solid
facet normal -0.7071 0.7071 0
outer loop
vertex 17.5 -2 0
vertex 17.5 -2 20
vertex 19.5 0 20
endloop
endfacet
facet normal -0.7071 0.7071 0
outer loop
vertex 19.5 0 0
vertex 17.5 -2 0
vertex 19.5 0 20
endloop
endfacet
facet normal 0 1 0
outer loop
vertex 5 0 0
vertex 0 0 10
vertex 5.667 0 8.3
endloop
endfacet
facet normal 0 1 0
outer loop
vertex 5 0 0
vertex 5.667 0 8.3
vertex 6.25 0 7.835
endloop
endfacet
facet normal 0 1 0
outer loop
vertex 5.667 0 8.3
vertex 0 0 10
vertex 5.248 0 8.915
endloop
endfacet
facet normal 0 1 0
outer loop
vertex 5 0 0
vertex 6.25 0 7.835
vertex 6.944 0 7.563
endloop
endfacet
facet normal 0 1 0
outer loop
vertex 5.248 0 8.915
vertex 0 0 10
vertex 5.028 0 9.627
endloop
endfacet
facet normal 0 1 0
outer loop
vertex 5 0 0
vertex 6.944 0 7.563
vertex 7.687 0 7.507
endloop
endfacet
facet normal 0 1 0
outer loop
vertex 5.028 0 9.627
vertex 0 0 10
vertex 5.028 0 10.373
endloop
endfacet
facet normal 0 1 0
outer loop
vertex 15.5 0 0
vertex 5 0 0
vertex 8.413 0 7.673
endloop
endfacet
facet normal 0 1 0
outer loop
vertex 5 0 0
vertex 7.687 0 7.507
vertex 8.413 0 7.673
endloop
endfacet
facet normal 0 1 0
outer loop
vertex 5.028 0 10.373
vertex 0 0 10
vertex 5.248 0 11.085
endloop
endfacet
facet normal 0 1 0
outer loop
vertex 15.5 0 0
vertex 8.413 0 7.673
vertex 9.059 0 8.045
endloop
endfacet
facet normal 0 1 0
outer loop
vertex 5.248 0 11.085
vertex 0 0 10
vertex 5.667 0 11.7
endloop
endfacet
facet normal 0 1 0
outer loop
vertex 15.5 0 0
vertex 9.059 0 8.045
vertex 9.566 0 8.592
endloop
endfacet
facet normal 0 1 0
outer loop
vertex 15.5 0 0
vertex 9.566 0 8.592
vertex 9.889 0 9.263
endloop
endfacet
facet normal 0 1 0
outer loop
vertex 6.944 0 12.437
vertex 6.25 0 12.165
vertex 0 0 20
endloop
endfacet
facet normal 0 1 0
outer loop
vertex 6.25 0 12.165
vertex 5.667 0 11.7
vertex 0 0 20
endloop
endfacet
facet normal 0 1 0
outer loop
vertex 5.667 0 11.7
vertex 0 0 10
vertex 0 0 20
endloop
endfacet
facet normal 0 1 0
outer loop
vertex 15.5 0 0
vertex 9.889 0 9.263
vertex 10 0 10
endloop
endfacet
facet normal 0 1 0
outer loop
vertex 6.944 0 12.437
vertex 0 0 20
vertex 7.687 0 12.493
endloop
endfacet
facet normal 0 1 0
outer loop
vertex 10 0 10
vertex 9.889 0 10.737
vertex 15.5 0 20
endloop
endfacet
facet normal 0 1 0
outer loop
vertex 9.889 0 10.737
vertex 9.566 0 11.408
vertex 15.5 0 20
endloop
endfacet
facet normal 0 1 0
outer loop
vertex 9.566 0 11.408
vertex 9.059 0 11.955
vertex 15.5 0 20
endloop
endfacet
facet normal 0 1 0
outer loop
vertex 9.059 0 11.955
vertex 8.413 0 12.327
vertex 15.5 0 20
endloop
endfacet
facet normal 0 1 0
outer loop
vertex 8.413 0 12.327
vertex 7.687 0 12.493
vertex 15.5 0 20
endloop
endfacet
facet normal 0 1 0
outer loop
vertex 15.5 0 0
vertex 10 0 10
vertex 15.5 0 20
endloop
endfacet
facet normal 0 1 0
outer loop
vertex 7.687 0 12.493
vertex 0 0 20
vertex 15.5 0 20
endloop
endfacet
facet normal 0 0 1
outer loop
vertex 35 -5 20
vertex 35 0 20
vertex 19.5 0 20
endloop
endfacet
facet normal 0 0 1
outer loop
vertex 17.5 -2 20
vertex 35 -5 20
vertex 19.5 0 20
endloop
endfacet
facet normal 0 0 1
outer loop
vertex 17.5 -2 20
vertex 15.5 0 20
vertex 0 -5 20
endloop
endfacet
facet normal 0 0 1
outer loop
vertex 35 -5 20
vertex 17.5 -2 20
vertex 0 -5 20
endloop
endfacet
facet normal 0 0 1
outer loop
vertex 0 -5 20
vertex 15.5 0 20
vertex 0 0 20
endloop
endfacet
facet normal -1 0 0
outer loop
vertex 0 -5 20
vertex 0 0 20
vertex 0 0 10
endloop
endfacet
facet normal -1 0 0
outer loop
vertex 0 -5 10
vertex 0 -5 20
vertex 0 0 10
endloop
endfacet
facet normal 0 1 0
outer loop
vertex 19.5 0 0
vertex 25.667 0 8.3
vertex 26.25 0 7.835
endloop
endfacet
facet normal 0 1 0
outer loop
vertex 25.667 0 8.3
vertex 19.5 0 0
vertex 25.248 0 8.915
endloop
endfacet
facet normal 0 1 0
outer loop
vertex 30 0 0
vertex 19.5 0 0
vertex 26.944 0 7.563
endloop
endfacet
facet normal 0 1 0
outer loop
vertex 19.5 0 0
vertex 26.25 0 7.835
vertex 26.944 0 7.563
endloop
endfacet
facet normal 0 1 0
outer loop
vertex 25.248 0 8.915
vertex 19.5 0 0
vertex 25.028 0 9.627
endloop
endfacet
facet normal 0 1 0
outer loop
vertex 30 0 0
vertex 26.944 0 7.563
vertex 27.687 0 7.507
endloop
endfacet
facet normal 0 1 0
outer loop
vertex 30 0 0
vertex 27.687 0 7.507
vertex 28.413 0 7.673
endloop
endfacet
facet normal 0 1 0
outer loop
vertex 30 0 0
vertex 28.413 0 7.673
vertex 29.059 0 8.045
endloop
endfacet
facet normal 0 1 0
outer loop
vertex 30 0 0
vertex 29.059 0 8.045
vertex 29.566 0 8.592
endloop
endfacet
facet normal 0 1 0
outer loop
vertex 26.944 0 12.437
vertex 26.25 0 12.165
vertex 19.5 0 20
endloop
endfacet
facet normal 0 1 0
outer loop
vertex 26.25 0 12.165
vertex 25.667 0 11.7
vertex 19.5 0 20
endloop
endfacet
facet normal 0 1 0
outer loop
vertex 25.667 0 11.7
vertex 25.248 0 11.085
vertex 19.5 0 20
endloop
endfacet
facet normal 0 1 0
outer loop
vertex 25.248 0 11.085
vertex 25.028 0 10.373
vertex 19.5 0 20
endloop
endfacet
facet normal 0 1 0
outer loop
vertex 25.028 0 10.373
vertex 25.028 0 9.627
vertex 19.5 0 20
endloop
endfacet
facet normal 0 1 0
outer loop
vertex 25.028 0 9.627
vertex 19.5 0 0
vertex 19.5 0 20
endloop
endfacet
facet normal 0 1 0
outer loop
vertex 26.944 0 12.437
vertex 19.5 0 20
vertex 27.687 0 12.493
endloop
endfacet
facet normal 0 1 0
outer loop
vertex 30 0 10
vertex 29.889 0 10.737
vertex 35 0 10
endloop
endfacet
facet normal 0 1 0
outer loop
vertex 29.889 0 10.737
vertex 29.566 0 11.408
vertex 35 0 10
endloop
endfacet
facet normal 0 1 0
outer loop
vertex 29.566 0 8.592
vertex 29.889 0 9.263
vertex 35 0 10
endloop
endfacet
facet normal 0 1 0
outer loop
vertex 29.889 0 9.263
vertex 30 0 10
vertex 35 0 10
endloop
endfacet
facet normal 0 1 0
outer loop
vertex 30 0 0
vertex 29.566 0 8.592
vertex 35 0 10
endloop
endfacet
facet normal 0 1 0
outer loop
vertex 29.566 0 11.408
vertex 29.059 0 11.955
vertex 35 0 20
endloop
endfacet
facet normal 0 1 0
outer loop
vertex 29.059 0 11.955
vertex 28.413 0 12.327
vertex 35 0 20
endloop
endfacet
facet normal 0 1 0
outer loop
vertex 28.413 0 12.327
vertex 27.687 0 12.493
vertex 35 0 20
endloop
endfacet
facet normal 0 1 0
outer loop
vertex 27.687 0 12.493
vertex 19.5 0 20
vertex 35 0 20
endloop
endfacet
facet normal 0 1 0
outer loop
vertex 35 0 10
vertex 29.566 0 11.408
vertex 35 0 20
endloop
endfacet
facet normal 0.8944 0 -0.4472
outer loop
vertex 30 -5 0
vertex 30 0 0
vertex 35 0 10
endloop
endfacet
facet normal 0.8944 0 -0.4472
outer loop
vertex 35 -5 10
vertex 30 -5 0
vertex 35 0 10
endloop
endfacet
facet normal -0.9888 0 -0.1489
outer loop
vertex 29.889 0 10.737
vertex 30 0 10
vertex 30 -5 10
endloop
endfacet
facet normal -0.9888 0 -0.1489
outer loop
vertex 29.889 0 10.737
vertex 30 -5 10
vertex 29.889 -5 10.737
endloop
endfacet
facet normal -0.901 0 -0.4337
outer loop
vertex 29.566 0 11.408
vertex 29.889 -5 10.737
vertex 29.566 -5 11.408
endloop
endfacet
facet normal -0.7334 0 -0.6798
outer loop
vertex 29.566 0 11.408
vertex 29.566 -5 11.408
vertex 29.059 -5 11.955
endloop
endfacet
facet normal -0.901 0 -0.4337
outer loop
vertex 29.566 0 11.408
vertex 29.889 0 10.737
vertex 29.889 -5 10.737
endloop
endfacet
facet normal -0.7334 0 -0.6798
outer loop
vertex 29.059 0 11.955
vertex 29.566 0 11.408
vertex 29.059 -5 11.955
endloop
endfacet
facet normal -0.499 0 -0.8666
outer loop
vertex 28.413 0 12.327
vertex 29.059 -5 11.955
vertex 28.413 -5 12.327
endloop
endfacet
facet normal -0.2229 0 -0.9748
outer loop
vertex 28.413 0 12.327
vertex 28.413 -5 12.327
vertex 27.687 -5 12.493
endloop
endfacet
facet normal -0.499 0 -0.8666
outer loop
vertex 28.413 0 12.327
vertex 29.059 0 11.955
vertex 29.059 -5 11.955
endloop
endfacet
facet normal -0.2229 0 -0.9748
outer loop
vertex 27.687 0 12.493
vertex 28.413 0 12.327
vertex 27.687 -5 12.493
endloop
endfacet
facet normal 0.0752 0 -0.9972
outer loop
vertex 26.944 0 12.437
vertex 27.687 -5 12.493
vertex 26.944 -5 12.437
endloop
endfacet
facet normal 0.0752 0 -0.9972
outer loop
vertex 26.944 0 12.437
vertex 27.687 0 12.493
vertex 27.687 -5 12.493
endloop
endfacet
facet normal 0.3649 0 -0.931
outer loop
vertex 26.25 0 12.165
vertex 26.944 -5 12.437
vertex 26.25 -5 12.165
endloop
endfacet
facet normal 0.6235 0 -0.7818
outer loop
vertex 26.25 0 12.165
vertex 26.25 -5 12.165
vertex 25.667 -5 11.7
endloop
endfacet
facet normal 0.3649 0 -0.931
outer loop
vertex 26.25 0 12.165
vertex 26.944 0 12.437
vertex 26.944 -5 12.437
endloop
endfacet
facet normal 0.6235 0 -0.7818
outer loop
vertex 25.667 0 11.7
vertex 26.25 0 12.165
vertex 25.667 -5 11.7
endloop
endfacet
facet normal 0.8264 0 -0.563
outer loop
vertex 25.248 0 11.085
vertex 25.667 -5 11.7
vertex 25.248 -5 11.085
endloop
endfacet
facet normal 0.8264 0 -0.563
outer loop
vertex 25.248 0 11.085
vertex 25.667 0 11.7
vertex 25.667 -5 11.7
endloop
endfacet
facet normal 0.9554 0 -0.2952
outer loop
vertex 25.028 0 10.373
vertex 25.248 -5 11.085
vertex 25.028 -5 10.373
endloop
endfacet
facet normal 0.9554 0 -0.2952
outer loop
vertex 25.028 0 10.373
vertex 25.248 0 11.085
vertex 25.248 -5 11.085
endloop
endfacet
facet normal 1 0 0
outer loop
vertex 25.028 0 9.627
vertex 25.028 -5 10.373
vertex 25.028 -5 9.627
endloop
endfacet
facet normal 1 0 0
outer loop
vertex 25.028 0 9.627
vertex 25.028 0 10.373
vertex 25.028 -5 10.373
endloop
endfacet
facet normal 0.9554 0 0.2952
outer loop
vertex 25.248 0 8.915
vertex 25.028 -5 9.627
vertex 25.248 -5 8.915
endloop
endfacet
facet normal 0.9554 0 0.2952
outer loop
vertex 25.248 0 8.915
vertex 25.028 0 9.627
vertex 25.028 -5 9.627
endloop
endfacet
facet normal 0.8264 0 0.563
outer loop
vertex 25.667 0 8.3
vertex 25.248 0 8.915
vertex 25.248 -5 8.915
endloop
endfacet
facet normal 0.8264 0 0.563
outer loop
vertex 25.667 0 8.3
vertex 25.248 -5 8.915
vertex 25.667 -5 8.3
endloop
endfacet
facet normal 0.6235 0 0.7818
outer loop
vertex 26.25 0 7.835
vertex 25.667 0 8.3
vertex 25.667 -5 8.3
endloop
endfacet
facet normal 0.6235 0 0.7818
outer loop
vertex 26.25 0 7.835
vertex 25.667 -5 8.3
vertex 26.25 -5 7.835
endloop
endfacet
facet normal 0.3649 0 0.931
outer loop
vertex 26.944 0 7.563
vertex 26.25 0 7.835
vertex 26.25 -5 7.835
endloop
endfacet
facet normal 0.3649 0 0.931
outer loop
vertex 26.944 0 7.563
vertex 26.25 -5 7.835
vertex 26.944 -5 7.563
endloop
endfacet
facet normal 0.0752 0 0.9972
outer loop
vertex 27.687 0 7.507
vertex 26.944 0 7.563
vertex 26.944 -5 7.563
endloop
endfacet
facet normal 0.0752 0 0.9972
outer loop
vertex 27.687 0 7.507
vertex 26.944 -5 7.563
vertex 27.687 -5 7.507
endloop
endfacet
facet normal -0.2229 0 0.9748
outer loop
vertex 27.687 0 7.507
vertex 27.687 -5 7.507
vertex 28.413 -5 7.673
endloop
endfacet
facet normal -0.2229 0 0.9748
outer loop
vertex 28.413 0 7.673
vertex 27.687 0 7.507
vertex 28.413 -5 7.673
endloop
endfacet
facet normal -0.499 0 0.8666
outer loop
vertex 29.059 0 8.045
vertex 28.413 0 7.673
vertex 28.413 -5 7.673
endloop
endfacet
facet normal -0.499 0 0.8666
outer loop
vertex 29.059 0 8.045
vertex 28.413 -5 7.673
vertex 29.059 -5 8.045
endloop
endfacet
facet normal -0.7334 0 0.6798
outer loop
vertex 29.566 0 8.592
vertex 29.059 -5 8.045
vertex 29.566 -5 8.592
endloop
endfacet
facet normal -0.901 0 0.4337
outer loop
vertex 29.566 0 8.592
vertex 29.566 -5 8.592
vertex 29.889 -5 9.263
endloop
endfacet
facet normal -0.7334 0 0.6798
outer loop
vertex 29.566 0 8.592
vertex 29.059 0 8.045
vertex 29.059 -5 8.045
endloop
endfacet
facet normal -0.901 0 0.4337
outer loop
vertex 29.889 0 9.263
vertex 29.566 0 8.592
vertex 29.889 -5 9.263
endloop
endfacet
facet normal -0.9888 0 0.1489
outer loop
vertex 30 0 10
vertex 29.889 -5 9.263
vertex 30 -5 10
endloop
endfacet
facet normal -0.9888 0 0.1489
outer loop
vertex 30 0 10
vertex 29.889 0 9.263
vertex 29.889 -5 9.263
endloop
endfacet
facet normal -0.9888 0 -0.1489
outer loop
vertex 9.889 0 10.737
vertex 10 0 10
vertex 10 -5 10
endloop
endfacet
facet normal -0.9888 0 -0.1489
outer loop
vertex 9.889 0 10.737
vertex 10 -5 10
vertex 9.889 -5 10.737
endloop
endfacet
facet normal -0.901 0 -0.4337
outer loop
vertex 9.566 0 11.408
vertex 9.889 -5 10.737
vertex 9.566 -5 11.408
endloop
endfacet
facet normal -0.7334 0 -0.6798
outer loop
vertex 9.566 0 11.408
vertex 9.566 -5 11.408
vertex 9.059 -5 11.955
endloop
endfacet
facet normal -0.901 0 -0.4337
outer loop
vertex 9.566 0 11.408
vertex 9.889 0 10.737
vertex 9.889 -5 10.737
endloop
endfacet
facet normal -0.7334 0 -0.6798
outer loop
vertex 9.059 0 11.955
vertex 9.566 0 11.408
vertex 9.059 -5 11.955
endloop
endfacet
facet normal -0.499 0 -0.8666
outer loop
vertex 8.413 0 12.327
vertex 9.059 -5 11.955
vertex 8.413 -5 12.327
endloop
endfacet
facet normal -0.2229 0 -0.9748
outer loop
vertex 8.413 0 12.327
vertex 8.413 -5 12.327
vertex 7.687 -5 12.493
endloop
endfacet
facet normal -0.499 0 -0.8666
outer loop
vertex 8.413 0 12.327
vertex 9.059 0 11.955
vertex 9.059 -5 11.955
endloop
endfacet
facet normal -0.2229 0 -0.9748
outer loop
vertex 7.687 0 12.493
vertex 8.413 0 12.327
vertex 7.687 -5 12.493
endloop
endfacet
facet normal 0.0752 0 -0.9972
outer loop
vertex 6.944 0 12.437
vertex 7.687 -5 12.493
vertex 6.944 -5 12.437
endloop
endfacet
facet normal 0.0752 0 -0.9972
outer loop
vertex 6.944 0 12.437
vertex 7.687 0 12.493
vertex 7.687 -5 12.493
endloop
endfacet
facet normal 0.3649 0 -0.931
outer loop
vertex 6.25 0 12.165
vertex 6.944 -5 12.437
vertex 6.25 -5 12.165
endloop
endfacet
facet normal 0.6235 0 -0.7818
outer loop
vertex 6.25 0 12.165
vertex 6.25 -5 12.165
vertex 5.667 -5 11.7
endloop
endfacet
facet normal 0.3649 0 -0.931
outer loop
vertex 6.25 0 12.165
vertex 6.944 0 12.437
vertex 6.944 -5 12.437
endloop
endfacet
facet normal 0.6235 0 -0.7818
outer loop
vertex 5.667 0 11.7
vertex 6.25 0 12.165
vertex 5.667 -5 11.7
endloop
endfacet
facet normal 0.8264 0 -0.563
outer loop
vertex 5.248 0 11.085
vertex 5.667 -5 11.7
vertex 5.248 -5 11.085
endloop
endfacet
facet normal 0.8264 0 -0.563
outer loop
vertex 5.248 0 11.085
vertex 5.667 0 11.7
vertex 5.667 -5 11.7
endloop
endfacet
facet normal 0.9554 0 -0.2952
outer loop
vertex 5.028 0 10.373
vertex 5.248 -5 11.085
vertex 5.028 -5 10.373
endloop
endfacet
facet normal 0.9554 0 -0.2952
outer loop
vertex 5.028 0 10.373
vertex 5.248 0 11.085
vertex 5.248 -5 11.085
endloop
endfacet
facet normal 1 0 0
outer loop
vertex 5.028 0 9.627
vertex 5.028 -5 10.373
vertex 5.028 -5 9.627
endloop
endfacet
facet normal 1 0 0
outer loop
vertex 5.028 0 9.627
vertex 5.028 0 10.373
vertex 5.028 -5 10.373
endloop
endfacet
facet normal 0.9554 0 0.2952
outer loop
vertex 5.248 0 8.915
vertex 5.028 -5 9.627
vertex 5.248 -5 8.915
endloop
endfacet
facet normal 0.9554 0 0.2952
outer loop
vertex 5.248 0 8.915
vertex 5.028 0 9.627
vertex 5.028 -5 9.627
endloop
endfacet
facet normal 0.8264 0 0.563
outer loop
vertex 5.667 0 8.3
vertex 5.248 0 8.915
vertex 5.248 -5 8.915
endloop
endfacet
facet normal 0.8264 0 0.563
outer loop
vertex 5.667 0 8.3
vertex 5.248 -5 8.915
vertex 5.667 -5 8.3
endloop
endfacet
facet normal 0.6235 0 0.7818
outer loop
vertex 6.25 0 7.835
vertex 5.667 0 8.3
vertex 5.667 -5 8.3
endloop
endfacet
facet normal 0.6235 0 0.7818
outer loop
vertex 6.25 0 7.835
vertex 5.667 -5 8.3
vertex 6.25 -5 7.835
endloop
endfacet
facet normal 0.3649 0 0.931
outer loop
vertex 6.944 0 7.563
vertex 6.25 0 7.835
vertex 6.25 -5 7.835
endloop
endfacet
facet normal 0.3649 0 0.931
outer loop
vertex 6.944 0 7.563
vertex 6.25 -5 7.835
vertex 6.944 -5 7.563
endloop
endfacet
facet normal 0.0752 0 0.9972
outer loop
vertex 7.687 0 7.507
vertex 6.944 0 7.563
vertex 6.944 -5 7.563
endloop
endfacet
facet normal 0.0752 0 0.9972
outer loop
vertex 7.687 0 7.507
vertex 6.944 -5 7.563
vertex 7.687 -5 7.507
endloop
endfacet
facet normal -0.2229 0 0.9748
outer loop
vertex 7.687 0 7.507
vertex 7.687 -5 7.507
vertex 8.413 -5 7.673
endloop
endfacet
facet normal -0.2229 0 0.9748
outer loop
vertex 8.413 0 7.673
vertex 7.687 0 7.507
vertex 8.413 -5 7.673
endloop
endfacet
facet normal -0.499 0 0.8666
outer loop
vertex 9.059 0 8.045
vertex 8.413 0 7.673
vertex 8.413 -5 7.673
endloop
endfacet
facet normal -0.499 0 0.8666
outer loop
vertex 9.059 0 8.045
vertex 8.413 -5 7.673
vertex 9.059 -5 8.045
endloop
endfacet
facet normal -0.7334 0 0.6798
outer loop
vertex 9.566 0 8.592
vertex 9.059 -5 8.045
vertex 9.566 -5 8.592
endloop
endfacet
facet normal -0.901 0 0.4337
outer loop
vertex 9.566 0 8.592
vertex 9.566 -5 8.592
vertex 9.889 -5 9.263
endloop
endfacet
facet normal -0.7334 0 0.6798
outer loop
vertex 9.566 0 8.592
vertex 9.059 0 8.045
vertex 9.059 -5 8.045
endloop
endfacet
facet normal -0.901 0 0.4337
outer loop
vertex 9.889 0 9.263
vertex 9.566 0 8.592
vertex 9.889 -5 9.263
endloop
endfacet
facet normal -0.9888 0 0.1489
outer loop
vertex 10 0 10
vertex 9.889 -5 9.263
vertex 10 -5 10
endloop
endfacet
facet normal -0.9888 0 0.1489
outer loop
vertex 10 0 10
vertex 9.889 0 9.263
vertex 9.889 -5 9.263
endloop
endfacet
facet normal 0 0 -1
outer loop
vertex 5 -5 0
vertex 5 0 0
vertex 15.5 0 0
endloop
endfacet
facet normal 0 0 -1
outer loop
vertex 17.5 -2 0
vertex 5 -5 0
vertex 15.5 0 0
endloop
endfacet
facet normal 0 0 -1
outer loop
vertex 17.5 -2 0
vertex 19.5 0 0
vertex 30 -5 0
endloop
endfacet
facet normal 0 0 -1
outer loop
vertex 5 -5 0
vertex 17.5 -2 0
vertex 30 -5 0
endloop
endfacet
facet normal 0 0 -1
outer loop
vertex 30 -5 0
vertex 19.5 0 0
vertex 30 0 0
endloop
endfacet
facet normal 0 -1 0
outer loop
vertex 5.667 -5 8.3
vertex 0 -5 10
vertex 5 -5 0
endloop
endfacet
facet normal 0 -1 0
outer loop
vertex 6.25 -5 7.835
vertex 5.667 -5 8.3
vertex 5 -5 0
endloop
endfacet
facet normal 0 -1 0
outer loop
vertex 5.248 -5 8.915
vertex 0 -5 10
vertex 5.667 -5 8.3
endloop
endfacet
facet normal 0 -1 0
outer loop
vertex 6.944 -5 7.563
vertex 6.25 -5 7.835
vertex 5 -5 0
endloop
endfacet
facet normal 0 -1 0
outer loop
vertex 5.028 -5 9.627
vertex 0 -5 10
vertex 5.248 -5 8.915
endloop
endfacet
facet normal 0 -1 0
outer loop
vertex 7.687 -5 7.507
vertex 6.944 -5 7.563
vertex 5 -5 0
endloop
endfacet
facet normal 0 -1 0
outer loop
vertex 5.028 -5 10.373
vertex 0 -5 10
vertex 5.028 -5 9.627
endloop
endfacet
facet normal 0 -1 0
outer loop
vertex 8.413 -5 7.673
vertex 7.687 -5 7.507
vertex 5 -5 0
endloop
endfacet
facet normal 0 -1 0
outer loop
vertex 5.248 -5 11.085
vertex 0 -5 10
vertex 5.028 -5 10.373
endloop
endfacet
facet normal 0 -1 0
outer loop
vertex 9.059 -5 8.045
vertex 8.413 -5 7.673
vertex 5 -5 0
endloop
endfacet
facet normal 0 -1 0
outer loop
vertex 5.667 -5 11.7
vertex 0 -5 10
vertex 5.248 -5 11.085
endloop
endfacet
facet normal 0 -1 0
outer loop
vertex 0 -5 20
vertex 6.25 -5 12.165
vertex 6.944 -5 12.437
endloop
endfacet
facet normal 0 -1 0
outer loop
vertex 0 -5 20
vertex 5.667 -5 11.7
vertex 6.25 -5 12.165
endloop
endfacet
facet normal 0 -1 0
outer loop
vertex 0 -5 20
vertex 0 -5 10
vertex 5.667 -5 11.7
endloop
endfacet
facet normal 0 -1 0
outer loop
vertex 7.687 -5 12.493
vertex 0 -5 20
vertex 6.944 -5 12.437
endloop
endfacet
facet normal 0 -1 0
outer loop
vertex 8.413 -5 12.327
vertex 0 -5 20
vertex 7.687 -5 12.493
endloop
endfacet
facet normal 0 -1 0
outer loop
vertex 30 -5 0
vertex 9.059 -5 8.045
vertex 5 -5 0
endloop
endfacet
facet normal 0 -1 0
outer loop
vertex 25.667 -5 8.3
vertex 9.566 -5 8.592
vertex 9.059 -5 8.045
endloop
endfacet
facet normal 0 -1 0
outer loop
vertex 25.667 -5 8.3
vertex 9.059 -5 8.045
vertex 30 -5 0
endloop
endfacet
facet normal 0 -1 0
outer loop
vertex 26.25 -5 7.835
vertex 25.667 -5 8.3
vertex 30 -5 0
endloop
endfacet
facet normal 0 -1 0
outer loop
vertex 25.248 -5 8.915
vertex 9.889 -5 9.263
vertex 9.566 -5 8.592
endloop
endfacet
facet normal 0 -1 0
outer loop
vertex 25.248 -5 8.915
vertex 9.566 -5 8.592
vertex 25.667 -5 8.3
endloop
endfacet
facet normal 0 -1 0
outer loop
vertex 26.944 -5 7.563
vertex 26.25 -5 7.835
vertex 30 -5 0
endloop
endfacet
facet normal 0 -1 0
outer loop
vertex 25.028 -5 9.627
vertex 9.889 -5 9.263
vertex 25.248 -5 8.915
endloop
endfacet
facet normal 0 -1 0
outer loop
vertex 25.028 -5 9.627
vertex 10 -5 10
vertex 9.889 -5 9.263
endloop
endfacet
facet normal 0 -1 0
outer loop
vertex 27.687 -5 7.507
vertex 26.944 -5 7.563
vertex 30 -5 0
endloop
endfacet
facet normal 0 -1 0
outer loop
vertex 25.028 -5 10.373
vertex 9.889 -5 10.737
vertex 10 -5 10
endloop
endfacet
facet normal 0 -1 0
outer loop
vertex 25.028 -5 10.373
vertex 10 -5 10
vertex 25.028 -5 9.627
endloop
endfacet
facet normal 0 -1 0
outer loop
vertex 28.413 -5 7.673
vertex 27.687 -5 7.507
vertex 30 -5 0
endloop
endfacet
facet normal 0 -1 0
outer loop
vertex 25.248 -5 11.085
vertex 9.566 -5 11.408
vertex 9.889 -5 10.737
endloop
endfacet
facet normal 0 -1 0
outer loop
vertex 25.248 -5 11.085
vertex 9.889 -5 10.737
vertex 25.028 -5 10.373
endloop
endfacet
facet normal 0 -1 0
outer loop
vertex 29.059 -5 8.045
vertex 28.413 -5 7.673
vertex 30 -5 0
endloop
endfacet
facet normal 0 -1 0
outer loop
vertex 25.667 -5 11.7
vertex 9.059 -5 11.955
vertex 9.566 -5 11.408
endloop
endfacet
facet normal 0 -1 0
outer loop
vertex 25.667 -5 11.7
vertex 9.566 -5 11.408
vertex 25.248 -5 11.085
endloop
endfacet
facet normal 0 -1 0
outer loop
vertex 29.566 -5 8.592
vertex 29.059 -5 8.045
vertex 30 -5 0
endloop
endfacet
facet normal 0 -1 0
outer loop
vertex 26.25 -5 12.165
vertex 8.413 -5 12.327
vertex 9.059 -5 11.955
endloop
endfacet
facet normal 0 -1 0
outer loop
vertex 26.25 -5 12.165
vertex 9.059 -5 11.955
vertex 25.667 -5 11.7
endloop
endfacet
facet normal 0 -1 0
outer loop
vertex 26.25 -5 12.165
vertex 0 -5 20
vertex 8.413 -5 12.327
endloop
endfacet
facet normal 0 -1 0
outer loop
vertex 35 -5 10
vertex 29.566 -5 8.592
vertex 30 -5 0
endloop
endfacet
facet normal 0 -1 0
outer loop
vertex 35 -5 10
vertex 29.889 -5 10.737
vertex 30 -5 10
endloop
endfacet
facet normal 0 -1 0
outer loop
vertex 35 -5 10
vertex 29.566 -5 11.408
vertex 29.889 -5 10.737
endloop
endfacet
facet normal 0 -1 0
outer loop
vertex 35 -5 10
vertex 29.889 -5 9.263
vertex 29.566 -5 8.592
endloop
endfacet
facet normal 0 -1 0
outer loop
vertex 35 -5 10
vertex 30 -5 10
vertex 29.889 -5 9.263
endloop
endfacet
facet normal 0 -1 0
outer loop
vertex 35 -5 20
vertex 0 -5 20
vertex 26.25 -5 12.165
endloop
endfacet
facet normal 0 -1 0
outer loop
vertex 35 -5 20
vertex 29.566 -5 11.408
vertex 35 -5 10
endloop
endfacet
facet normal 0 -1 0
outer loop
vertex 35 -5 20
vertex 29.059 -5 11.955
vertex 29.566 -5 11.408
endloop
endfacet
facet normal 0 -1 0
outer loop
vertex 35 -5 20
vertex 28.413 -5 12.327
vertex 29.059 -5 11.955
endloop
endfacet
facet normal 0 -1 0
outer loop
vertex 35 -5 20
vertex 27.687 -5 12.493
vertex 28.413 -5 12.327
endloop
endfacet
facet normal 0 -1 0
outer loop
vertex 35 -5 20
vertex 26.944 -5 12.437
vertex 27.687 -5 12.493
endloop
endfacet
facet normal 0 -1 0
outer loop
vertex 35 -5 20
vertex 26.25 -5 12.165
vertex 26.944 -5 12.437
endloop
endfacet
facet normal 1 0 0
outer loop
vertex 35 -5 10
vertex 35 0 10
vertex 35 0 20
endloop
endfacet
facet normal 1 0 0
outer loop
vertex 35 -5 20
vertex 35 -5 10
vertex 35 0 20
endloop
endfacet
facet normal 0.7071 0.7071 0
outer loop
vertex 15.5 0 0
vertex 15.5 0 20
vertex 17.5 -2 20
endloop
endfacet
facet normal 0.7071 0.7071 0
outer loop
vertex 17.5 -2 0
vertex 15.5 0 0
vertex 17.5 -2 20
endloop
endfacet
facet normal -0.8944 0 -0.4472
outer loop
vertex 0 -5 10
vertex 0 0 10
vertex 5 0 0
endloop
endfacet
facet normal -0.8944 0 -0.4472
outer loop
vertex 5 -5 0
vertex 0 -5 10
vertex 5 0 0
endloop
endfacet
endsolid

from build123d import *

# Parameters (mm, degrees)
SKETCH002_R      = 2.5
EXTRUDE002_DEPTH = 5
EXTRUDE001_DEPTH = 20
EXTRUDE_DEPTH    = 5


with BuildPart() as extrude002:
    # Sketch002 (on Cut) → Extrude002 (new body)
    with BuildSketch(Plane.XZ):
        with Locations((27.5, 10)):
            Circle(SKETCH002_R)
        with Locations((7.5, 10)):
            Circle(SKETCH002_R)
    extrude(amount=EXTRUDE002_DEPTH)


with BuildPart() as extrude001:
    # Sketch001 (on Extrude) → Extrude001 (new body)
    with BuildSketch(Plane.XY):
        Polygon((15.5, 0), (17.5, -2), (19.5, 0), align=None)
    extrude(amount=EXTRUDE001_DEPTH)


with BuildPart() as cut001:
    # Sketch → Extrude (new body)
    with BuildSketch(Plane.XZ):
        Polygon((0, 10), (5, 0), (30, 0), (35, 10), (35, 20), (0, 20), align=None)
    extrude(amount=EXTRUDE_DEPTH)

    # Cut: cut Extrude001
    add(extrude001.part, mode=Mode.SUBTRACT)

    # Cut001: cut Extrude002
    add(extrude002.part, mode=Mode.SUBTRACT)


solid = cut001.part
